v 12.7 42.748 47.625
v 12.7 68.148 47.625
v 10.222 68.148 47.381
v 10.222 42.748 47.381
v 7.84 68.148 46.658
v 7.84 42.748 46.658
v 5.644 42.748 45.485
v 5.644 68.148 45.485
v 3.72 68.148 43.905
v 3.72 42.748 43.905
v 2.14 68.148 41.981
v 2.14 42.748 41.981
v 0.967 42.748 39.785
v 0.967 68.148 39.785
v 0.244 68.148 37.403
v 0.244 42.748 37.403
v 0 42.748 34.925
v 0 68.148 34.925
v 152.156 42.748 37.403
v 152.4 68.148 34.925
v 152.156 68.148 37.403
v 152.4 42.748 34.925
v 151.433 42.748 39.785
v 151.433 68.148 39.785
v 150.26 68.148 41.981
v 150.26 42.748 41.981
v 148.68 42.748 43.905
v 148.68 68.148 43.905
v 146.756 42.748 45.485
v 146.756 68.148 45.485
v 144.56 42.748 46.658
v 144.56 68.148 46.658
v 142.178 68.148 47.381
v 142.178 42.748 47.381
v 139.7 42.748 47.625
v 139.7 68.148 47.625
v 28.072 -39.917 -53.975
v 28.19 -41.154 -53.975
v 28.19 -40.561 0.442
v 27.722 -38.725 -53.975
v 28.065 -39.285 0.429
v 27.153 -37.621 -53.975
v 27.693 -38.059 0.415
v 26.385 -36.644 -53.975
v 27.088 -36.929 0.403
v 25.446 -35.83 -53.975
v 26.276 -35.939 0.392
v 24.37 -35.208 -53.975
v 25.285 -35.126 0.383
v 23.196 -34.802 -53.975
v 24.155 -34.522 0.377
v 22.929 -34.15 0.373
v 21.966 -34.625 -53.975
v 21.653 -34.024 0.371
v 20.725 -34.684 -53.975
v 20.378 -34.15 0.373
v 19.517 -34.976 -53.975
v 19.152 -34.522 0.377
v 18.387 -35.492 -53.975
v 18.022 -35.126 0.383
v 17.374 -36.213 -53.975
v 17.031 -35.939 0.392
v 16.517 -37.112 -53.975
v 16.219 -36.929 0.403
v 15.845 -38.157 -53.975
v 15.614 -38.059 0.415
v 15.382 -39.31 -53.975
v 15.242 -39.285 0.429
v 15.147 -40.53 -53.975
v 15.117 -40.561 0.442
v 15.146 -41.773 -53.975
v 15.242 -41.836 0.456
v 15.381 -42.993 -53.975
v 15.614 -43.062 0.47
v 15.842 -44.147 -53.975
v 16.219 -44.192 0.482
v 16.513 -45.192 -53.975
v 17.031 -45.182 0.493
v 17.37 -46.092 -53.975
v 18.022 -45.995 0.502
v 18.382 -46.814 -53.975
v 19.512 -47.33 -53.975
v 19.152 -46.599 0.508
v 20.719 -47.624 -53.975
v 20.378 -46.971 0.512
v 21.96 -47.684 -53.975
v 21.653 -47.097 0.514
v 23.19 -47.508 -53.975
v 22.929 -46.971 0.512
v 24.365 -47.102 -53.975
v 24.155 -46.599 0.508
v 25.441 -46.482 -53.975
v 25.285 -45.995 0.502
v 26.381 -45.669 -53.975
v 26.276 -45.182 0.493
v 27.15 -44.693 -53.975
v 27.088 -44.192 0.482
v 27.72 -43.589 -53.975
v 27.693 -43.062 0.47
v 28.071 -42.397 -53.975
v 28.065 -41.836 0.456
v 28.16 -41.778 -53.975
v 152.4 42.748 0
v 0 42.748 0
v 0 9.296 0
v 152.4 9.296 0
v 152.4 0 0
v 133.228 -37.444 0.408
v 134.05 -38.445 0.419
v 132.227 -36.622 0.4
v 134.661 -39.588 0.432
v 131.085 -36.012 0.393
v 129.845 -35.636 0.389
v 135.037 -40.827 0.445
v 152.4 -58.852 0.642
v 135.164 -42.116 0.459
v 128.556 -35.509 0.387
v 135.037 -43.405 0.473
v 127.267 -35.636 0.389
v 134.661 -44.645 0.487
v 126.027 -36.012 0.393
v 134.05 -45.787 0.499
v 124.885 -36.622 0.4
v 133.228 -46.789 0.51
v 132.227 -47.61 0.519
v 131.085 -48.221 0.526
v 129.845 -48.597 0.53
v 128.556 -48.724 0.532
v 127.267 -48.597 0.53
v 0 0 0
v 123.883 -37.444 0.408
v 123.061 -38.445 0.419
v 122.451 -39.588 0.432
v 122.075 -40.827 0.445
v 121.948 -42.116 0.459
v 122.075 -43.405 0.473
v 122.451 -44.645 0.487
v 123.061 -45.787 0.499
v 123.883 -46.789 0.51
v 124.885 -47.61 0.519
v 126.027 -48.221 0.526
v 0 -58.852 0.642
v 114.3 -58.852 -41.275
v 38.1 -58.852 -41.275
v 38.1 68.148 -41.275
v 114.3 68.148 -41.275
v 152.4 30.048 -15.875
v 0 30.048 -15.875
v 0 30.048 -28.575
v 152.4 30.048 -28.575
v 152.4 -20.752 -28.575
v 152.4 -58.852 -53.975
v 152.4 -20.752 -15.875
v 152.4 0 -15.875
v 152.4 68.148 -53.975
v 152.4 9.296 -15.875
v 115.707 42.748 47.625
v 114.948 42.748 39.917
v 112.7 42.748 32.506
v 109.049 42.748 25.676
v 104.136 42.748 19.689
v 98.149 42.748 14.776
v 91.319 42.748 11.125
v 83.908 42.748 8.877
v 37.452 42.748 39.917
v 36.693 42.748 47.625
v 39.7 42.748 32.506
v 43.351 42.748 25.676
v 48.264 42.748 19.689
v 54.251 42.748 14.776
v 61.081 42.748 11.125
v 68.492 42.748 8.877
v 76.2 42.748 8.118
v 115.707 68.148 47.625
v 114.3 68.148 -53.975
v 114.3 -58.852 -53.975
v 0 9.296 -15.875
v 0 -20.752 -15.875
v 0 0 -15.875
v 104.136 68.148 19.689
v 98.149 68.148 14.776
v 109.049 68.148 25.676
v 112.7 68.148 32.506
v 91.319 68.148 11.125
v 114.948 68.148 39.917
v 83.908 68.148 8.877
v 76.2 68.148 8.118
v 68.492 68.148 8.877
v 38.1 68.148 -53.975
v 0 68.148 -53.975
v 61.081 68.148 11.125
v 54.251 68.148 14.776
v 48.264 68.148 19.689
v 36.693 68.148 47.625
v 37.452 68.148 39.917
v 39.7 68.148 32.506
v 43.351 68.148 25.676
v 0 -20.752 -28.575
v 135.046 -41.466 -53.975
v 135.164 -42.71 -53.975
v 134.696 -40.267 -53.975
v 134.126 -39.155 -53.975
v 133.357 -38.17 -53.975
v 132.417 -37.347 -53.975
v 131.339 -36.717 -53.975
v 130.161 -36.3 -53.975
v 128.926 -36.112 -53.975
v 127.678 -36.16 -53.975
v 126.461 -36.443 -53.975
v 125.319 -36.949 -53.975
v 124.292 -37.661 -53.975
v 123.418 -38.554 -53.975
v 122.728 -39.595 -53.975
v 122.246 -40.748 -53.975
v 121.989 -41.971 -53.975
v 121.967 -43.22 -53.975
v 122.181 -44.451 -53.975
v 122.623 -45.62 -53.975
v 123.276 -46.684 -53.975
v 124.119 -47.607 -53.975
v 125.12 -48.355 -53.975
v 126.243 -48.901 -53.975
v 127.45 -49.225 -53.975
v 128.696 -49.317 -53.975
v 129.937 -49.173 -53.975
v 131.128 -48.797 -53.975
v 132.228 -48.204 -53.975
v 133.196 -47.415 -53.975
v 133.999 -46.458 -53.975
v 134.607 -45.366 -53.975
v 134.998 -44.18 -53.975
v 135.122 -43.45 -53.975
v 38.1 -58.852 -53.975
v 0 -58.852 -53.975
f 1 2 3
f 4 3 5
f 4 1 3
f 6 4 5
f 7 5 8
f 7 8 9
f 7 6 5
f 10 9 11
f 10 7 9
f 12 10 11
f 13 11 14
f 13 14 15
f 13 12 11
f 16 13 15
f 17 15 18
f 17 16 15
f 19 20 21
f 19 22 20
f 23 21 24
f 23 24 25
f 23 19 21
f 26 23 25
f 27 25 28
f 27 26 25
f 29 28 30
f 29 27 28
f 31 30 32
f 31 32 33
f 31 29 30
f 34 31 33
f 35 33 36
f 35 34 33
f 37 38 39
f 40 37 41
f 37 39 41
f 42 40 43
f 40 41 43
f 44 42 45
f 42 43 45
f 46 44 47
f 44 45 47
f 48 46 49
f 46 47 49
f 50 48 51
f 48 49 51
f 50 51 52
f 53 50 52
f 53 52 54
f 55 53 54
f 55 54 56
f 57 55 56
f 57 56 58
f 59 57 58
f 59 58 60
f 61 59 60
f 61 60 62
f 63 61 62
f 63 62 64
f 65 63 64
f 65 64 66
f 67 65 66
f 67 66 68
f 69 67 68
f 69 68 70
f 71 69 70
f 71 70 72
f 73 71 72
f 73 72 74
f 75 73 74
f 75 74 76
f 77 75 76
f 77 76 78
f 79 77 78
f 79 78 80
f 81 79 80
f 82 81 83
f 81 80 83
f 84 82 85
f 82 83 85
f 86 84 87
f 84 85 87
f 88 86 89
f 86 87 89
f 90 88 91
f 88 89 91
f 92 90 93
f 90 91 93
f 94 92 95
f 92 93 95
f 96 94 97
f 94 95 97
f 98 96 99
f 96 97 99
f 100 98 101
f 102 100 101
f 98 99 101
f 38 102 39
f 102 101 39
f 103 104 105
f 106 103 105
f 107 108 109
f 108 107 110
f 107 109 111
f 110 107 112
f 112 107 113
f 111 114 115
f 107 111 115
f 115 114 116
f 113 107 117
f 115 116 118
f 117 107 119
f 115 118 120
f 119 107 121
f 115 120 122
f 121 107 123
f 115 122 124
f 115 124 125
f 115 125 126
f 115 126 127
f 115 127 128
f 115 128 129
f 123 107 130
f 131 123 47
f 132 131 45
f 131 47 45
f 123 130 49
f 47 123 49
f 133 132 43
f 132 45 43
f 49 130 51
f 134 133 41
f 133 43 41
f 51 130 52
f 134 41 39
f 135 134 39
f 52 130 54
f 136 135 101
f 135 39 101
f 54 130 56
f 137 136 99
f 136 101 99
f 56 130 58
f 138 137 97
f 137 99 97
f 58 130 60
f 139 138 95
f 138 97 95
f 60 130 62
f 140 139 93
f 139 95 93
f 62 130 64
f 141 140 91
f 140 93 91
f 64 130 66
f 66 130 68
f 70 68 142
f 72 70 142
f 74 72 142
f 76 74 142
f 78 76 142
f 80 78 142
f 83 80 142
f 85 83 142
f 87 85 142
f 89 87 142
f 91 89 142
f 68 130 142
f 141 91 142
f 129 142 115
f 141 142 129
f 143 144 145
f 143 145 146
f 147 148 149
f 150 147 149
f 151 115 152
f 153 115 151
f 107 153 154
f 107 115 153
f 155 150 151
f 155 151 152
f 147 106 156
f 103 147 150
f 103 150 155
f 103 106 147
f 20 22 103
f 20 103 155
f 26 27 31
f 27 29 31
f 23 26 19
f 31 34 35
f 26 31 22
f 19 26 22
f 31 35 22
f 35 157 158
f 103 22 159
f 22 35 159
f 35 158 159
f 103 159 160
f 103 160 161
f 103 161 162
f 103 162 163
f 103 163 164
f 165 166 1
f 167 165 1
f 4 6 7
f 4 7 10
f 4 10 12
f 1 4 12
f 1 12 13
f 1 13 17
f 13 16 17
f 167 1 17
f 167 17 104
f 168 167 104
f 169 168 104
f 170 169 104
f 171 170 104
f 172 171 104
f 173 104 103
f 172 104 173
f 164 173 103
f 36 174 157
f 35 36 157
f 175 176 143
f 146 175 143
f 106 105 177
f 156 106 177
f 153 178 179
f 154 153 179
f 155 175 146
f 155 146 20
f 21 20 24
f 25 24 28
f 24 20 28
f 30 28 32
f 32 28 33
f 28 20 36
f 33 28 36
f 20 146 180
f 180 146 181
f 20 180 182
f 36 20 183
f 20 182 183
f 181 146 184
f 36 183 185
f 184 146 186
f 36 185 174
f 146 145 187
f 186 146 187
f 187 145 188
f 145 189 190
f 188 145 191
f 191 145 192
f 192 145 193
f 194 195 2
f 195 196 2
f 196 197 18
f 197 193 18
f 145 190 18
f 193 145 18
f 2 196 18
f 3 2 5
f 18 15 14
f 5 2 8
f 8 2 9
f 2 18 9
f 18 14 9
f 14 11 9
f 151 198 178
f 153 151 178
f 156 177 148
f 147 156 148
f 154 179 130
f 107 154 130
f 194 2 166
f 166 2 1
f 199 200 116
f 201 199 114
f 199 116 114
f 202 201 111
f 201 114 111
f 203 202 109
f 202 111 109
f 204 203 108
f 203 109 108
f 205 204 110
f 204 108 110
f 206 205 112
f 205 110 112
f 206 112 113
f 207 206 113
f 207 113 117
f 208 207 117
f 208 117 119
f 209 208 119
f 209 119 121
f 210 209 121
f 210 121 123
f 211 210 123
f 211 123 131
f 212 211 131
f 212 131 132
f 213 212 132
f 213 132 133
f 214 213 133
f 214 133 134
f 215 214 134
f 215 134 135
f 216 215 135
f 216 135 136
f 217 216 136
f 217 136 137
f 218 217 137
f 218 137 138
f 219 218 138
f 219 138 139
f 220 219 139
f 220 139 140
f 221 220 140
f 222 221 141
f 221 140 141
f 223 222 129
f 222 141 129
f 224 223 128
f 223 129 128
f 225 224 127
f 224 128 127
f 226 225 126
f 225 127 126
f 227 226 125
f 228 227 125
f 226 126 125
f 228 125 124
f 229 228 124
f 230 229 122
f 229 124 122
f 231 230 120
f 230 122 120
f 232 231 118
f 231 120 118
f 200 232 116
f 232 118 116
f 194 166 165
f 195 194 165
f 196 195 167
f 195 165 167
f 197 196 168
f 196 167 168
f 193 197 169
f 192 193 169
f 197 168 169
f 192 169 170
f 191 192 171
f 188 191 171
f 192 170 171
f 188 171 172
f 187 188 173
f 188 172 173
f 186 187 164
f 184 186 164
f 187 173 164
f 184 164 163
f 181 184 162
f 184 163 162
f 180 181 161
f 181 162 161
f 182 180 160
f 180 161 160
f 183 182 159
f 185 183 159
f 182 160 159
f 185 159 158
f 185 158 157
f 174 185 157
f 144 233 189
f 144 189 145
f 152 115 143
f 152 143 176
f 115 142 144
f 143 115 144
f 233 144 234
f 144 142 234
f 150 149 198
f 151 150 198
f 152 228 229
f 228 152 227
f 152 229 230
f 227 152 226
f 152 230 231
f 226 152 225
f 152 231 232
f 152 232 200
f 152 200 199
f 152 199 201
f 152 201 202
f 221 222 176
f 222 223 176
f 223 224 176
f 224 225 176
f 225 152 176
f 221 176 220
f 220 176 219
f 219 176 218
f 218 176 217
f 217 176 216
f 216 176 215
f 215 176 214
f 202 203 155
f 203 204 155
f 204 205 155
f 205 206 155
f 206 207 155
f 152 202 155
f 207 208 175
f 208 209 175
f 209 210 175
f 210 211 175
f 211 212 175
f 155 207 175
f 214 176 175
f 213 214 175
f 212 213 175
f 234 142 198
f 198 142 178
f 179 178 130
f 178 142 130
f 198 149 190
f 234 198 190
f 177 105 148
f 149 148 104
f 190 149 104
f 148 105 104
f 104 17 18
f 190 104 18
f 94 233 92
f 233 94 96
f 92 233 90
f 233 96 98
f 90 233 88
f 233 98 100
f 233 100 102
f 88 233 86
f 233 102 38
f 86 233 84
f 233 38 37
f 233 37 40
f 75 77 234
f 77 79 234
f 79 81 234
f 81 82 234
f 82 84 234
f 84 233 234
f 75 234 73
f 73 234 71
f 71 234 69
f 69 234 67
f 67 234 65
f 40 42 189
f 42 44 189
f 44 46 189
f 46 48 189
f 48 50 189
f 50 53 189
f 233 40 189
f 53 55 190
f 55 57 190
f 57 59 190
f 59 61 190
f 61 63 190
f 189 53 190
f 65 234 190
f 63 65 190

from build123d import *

# Parameters (mm, degrees)
F1_DEPTH = 152.4
F2_W     = 76.2
F2_H     = 12.7
F3_DEPTH = 127.001
F4_R     = 39.507453211
F5_DEPTH = 25.4
F6_R     = 12.7
F7_R     = 6.6080051974
F7_R_2   = 6.5366056143
F8_DEPTH = 54.6147514972


with BuildPart() as f1:
    # F0 (on Right) → F1 (new body)
    with BuildSketch(Plane.YZ):
        Polygon((68.1480239093, 47.625), (42.7480239093, 47.625), (42.7480239093, 0), (9.2960478187, 0), (9.2960478187, -15.875), (30.0480239093, -15.875), (30.0480239093, -28.575), (-20.7519760907, -28.575), (-20.7519760907, -15.875), (0, -15.875), (0, 0), (-58.8519760907, 0.6420009357), (-58.8519760907, -53.975), (68.1480239093, -53.975), align=None)
    extrude(amount=F1_DEPTH)

    # F2 (on face) → F3 (cut, through all)
    with BuildSketch(Plane.XZ.offset(58.8519760907)):
        with Locations((76.2, -47.625)):
            Rectangle(F2_W, F2_H)
    extrude(amount=-F3_DEPTH, mode=Mode.SUBTRACT)

    # F4 (on face) → F5 (cut)
    with BuildSketch(Plane.XZ.offset(-42.7480239093)):
        with Locations((76.2, 47.625)):
            Circle(F4_R)
        with BuildLine():
            ThreePointArc((36.692546789, 47.625), (76.2, 8.117546789), (115.707453211, 47.625))
            Line((115.707453211, 47.625), (36.692546789, 47.625))
        make_face()
    extrude(amount=-F5_DEPTH, mode=Mode.SUBTRACT)

    # F6
    f6_edges = [f1.edges().sort_by_distance(p)[0] for p in [
        (152.4, 55.448024, 47.625),
        (0, 55.448024, 47.625),
    ]]
    fillet(f6_edges, radius=F6_R)

    # F7 (on face) → F8 (cut, through all)
    with BuildSketch(Plane(origin=(0, 0, 0), x_dir=(1, 0, 0), z_dir=(0, 0.0109080915, 0.999940505))):
        with Locations((128.5557597876, -42.1188808978)):
            Circle(F7_R)
        with Locations((21.6534994543, -40.5630394816)):
            Circle(F7_R_2)
    extrude(amount=-F8_DEPTH, mode=Mode.SUBTRACT)


solid = f1.part
